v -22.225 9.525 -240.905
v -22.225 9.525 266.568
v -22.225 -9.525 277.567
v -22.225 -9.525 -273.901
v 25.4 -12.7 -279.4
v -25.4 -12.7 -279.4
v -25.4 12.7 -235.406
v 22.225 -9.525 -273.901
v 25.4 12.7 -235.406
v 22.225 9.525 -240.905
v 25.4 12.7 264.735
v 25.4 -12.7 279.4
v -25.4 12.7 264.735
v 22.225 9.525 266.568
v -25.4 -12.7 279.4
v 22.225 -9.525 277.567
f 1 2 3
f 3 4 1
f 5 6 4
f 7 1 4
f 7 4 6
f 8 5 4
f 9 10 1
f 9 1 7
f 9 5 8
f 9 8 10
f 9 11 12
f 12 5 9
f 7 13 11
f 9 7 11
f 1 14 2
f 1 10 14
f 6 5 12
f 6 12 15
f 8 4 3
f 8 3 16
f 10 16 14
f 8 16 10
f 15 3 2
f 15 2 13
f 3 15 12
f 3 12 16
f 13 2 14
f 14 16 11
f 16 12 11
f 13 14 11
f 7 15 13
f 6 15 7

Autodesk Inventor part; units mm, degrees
ref_plane "YZ Plane" through (0, 0, 0) normal (1, 0, 0) x (0, 1, 0)
ref_plane "XZ Plane" through (0, 0, 0) normal (0, 1, 0) x (-1, 0, 0)
ref_plane "XY Plane" through (0, 0, 0) normal (0, 0, 1) x (1, 0, 0)
sketch "Sketch1" plane through (0, 0, 0) normal (0, 0, 1) x (1, 0, 0)
  line L0 (-35.56, 0) -> (35.56, 0) projected
  line L1 (0, -17.78) -> (0, 17.78) projected
  line L2 (-25.4, 12.7) -> (25.4, 12.7)
  line L3 (25.4, 12.7) -> (25.4, -12.7)
  line L4 (25.4, -12.7) -> (-25.4, -12.7)
  line L5 (-25.4, -12.7) -> (-25.4, 12.7)
  line L6 (22.225, 9.525) -> (-22.225, 9.525)
  line L7 (-22.225, 9.525) -> (-22.225, -9.525)
  line L8 (-22.225, -9.525) -> (22.225, -9.525)
  line L9 (22.225, -9.525) -> (22.225, 9.525)
  point P0 (0, 0)
  point P1 (-25.4, 0)
  point P2 (0, 12.7)
  dimension "d0" = 25.4
  dimension "d1" = 3.175
  dimension "d7" = 50.8
extrude "Base" add sketch "Sketch1" along normal mid plane 558.8 contours L5 L2 L1 L6 L7 L0 | L0 L7 L8 L1 L4 L5 | L1 L8 L9 L0 L3 L4 | L2 L3 L0 L9 L6 L1
sketch "Sketch3" plane through (25.4, -12.7, 279.4) normal (1, 0, 0) x (0, 0, -1)
  line L0 (0, 25.4) -> (0, 0) projected
  line L1 (0, 25.4) -> (558.8, 25.4) projected
  line L2 (0, 0) -> (14.6647, 25.4)
  point P0 (279.4, 12.7)
  dimension "d8" = 30
extrude "Extrusion3" cut sketch "Sketch3" against normal through all
sketch "Sketch4" plane through (25.4, -12.7, -279.4) normal (1, 0, 0) x (0, 0, -1)
  line L0 (0, 0) -> (0, 25.4) projected
  line L1 (-544.1353, 25.4) -> (0, 25.4) projected
  line L2 (0, 0) -> (-43.9941, 25.4)
  point P0 (-279.4, 12.7)
  dimension "d11" = 60
extrude "Extrusion4" cut sketch "Sketch4" against normal through all
properties part number "tubing_template_0.125" material "Aluminum-6061"
